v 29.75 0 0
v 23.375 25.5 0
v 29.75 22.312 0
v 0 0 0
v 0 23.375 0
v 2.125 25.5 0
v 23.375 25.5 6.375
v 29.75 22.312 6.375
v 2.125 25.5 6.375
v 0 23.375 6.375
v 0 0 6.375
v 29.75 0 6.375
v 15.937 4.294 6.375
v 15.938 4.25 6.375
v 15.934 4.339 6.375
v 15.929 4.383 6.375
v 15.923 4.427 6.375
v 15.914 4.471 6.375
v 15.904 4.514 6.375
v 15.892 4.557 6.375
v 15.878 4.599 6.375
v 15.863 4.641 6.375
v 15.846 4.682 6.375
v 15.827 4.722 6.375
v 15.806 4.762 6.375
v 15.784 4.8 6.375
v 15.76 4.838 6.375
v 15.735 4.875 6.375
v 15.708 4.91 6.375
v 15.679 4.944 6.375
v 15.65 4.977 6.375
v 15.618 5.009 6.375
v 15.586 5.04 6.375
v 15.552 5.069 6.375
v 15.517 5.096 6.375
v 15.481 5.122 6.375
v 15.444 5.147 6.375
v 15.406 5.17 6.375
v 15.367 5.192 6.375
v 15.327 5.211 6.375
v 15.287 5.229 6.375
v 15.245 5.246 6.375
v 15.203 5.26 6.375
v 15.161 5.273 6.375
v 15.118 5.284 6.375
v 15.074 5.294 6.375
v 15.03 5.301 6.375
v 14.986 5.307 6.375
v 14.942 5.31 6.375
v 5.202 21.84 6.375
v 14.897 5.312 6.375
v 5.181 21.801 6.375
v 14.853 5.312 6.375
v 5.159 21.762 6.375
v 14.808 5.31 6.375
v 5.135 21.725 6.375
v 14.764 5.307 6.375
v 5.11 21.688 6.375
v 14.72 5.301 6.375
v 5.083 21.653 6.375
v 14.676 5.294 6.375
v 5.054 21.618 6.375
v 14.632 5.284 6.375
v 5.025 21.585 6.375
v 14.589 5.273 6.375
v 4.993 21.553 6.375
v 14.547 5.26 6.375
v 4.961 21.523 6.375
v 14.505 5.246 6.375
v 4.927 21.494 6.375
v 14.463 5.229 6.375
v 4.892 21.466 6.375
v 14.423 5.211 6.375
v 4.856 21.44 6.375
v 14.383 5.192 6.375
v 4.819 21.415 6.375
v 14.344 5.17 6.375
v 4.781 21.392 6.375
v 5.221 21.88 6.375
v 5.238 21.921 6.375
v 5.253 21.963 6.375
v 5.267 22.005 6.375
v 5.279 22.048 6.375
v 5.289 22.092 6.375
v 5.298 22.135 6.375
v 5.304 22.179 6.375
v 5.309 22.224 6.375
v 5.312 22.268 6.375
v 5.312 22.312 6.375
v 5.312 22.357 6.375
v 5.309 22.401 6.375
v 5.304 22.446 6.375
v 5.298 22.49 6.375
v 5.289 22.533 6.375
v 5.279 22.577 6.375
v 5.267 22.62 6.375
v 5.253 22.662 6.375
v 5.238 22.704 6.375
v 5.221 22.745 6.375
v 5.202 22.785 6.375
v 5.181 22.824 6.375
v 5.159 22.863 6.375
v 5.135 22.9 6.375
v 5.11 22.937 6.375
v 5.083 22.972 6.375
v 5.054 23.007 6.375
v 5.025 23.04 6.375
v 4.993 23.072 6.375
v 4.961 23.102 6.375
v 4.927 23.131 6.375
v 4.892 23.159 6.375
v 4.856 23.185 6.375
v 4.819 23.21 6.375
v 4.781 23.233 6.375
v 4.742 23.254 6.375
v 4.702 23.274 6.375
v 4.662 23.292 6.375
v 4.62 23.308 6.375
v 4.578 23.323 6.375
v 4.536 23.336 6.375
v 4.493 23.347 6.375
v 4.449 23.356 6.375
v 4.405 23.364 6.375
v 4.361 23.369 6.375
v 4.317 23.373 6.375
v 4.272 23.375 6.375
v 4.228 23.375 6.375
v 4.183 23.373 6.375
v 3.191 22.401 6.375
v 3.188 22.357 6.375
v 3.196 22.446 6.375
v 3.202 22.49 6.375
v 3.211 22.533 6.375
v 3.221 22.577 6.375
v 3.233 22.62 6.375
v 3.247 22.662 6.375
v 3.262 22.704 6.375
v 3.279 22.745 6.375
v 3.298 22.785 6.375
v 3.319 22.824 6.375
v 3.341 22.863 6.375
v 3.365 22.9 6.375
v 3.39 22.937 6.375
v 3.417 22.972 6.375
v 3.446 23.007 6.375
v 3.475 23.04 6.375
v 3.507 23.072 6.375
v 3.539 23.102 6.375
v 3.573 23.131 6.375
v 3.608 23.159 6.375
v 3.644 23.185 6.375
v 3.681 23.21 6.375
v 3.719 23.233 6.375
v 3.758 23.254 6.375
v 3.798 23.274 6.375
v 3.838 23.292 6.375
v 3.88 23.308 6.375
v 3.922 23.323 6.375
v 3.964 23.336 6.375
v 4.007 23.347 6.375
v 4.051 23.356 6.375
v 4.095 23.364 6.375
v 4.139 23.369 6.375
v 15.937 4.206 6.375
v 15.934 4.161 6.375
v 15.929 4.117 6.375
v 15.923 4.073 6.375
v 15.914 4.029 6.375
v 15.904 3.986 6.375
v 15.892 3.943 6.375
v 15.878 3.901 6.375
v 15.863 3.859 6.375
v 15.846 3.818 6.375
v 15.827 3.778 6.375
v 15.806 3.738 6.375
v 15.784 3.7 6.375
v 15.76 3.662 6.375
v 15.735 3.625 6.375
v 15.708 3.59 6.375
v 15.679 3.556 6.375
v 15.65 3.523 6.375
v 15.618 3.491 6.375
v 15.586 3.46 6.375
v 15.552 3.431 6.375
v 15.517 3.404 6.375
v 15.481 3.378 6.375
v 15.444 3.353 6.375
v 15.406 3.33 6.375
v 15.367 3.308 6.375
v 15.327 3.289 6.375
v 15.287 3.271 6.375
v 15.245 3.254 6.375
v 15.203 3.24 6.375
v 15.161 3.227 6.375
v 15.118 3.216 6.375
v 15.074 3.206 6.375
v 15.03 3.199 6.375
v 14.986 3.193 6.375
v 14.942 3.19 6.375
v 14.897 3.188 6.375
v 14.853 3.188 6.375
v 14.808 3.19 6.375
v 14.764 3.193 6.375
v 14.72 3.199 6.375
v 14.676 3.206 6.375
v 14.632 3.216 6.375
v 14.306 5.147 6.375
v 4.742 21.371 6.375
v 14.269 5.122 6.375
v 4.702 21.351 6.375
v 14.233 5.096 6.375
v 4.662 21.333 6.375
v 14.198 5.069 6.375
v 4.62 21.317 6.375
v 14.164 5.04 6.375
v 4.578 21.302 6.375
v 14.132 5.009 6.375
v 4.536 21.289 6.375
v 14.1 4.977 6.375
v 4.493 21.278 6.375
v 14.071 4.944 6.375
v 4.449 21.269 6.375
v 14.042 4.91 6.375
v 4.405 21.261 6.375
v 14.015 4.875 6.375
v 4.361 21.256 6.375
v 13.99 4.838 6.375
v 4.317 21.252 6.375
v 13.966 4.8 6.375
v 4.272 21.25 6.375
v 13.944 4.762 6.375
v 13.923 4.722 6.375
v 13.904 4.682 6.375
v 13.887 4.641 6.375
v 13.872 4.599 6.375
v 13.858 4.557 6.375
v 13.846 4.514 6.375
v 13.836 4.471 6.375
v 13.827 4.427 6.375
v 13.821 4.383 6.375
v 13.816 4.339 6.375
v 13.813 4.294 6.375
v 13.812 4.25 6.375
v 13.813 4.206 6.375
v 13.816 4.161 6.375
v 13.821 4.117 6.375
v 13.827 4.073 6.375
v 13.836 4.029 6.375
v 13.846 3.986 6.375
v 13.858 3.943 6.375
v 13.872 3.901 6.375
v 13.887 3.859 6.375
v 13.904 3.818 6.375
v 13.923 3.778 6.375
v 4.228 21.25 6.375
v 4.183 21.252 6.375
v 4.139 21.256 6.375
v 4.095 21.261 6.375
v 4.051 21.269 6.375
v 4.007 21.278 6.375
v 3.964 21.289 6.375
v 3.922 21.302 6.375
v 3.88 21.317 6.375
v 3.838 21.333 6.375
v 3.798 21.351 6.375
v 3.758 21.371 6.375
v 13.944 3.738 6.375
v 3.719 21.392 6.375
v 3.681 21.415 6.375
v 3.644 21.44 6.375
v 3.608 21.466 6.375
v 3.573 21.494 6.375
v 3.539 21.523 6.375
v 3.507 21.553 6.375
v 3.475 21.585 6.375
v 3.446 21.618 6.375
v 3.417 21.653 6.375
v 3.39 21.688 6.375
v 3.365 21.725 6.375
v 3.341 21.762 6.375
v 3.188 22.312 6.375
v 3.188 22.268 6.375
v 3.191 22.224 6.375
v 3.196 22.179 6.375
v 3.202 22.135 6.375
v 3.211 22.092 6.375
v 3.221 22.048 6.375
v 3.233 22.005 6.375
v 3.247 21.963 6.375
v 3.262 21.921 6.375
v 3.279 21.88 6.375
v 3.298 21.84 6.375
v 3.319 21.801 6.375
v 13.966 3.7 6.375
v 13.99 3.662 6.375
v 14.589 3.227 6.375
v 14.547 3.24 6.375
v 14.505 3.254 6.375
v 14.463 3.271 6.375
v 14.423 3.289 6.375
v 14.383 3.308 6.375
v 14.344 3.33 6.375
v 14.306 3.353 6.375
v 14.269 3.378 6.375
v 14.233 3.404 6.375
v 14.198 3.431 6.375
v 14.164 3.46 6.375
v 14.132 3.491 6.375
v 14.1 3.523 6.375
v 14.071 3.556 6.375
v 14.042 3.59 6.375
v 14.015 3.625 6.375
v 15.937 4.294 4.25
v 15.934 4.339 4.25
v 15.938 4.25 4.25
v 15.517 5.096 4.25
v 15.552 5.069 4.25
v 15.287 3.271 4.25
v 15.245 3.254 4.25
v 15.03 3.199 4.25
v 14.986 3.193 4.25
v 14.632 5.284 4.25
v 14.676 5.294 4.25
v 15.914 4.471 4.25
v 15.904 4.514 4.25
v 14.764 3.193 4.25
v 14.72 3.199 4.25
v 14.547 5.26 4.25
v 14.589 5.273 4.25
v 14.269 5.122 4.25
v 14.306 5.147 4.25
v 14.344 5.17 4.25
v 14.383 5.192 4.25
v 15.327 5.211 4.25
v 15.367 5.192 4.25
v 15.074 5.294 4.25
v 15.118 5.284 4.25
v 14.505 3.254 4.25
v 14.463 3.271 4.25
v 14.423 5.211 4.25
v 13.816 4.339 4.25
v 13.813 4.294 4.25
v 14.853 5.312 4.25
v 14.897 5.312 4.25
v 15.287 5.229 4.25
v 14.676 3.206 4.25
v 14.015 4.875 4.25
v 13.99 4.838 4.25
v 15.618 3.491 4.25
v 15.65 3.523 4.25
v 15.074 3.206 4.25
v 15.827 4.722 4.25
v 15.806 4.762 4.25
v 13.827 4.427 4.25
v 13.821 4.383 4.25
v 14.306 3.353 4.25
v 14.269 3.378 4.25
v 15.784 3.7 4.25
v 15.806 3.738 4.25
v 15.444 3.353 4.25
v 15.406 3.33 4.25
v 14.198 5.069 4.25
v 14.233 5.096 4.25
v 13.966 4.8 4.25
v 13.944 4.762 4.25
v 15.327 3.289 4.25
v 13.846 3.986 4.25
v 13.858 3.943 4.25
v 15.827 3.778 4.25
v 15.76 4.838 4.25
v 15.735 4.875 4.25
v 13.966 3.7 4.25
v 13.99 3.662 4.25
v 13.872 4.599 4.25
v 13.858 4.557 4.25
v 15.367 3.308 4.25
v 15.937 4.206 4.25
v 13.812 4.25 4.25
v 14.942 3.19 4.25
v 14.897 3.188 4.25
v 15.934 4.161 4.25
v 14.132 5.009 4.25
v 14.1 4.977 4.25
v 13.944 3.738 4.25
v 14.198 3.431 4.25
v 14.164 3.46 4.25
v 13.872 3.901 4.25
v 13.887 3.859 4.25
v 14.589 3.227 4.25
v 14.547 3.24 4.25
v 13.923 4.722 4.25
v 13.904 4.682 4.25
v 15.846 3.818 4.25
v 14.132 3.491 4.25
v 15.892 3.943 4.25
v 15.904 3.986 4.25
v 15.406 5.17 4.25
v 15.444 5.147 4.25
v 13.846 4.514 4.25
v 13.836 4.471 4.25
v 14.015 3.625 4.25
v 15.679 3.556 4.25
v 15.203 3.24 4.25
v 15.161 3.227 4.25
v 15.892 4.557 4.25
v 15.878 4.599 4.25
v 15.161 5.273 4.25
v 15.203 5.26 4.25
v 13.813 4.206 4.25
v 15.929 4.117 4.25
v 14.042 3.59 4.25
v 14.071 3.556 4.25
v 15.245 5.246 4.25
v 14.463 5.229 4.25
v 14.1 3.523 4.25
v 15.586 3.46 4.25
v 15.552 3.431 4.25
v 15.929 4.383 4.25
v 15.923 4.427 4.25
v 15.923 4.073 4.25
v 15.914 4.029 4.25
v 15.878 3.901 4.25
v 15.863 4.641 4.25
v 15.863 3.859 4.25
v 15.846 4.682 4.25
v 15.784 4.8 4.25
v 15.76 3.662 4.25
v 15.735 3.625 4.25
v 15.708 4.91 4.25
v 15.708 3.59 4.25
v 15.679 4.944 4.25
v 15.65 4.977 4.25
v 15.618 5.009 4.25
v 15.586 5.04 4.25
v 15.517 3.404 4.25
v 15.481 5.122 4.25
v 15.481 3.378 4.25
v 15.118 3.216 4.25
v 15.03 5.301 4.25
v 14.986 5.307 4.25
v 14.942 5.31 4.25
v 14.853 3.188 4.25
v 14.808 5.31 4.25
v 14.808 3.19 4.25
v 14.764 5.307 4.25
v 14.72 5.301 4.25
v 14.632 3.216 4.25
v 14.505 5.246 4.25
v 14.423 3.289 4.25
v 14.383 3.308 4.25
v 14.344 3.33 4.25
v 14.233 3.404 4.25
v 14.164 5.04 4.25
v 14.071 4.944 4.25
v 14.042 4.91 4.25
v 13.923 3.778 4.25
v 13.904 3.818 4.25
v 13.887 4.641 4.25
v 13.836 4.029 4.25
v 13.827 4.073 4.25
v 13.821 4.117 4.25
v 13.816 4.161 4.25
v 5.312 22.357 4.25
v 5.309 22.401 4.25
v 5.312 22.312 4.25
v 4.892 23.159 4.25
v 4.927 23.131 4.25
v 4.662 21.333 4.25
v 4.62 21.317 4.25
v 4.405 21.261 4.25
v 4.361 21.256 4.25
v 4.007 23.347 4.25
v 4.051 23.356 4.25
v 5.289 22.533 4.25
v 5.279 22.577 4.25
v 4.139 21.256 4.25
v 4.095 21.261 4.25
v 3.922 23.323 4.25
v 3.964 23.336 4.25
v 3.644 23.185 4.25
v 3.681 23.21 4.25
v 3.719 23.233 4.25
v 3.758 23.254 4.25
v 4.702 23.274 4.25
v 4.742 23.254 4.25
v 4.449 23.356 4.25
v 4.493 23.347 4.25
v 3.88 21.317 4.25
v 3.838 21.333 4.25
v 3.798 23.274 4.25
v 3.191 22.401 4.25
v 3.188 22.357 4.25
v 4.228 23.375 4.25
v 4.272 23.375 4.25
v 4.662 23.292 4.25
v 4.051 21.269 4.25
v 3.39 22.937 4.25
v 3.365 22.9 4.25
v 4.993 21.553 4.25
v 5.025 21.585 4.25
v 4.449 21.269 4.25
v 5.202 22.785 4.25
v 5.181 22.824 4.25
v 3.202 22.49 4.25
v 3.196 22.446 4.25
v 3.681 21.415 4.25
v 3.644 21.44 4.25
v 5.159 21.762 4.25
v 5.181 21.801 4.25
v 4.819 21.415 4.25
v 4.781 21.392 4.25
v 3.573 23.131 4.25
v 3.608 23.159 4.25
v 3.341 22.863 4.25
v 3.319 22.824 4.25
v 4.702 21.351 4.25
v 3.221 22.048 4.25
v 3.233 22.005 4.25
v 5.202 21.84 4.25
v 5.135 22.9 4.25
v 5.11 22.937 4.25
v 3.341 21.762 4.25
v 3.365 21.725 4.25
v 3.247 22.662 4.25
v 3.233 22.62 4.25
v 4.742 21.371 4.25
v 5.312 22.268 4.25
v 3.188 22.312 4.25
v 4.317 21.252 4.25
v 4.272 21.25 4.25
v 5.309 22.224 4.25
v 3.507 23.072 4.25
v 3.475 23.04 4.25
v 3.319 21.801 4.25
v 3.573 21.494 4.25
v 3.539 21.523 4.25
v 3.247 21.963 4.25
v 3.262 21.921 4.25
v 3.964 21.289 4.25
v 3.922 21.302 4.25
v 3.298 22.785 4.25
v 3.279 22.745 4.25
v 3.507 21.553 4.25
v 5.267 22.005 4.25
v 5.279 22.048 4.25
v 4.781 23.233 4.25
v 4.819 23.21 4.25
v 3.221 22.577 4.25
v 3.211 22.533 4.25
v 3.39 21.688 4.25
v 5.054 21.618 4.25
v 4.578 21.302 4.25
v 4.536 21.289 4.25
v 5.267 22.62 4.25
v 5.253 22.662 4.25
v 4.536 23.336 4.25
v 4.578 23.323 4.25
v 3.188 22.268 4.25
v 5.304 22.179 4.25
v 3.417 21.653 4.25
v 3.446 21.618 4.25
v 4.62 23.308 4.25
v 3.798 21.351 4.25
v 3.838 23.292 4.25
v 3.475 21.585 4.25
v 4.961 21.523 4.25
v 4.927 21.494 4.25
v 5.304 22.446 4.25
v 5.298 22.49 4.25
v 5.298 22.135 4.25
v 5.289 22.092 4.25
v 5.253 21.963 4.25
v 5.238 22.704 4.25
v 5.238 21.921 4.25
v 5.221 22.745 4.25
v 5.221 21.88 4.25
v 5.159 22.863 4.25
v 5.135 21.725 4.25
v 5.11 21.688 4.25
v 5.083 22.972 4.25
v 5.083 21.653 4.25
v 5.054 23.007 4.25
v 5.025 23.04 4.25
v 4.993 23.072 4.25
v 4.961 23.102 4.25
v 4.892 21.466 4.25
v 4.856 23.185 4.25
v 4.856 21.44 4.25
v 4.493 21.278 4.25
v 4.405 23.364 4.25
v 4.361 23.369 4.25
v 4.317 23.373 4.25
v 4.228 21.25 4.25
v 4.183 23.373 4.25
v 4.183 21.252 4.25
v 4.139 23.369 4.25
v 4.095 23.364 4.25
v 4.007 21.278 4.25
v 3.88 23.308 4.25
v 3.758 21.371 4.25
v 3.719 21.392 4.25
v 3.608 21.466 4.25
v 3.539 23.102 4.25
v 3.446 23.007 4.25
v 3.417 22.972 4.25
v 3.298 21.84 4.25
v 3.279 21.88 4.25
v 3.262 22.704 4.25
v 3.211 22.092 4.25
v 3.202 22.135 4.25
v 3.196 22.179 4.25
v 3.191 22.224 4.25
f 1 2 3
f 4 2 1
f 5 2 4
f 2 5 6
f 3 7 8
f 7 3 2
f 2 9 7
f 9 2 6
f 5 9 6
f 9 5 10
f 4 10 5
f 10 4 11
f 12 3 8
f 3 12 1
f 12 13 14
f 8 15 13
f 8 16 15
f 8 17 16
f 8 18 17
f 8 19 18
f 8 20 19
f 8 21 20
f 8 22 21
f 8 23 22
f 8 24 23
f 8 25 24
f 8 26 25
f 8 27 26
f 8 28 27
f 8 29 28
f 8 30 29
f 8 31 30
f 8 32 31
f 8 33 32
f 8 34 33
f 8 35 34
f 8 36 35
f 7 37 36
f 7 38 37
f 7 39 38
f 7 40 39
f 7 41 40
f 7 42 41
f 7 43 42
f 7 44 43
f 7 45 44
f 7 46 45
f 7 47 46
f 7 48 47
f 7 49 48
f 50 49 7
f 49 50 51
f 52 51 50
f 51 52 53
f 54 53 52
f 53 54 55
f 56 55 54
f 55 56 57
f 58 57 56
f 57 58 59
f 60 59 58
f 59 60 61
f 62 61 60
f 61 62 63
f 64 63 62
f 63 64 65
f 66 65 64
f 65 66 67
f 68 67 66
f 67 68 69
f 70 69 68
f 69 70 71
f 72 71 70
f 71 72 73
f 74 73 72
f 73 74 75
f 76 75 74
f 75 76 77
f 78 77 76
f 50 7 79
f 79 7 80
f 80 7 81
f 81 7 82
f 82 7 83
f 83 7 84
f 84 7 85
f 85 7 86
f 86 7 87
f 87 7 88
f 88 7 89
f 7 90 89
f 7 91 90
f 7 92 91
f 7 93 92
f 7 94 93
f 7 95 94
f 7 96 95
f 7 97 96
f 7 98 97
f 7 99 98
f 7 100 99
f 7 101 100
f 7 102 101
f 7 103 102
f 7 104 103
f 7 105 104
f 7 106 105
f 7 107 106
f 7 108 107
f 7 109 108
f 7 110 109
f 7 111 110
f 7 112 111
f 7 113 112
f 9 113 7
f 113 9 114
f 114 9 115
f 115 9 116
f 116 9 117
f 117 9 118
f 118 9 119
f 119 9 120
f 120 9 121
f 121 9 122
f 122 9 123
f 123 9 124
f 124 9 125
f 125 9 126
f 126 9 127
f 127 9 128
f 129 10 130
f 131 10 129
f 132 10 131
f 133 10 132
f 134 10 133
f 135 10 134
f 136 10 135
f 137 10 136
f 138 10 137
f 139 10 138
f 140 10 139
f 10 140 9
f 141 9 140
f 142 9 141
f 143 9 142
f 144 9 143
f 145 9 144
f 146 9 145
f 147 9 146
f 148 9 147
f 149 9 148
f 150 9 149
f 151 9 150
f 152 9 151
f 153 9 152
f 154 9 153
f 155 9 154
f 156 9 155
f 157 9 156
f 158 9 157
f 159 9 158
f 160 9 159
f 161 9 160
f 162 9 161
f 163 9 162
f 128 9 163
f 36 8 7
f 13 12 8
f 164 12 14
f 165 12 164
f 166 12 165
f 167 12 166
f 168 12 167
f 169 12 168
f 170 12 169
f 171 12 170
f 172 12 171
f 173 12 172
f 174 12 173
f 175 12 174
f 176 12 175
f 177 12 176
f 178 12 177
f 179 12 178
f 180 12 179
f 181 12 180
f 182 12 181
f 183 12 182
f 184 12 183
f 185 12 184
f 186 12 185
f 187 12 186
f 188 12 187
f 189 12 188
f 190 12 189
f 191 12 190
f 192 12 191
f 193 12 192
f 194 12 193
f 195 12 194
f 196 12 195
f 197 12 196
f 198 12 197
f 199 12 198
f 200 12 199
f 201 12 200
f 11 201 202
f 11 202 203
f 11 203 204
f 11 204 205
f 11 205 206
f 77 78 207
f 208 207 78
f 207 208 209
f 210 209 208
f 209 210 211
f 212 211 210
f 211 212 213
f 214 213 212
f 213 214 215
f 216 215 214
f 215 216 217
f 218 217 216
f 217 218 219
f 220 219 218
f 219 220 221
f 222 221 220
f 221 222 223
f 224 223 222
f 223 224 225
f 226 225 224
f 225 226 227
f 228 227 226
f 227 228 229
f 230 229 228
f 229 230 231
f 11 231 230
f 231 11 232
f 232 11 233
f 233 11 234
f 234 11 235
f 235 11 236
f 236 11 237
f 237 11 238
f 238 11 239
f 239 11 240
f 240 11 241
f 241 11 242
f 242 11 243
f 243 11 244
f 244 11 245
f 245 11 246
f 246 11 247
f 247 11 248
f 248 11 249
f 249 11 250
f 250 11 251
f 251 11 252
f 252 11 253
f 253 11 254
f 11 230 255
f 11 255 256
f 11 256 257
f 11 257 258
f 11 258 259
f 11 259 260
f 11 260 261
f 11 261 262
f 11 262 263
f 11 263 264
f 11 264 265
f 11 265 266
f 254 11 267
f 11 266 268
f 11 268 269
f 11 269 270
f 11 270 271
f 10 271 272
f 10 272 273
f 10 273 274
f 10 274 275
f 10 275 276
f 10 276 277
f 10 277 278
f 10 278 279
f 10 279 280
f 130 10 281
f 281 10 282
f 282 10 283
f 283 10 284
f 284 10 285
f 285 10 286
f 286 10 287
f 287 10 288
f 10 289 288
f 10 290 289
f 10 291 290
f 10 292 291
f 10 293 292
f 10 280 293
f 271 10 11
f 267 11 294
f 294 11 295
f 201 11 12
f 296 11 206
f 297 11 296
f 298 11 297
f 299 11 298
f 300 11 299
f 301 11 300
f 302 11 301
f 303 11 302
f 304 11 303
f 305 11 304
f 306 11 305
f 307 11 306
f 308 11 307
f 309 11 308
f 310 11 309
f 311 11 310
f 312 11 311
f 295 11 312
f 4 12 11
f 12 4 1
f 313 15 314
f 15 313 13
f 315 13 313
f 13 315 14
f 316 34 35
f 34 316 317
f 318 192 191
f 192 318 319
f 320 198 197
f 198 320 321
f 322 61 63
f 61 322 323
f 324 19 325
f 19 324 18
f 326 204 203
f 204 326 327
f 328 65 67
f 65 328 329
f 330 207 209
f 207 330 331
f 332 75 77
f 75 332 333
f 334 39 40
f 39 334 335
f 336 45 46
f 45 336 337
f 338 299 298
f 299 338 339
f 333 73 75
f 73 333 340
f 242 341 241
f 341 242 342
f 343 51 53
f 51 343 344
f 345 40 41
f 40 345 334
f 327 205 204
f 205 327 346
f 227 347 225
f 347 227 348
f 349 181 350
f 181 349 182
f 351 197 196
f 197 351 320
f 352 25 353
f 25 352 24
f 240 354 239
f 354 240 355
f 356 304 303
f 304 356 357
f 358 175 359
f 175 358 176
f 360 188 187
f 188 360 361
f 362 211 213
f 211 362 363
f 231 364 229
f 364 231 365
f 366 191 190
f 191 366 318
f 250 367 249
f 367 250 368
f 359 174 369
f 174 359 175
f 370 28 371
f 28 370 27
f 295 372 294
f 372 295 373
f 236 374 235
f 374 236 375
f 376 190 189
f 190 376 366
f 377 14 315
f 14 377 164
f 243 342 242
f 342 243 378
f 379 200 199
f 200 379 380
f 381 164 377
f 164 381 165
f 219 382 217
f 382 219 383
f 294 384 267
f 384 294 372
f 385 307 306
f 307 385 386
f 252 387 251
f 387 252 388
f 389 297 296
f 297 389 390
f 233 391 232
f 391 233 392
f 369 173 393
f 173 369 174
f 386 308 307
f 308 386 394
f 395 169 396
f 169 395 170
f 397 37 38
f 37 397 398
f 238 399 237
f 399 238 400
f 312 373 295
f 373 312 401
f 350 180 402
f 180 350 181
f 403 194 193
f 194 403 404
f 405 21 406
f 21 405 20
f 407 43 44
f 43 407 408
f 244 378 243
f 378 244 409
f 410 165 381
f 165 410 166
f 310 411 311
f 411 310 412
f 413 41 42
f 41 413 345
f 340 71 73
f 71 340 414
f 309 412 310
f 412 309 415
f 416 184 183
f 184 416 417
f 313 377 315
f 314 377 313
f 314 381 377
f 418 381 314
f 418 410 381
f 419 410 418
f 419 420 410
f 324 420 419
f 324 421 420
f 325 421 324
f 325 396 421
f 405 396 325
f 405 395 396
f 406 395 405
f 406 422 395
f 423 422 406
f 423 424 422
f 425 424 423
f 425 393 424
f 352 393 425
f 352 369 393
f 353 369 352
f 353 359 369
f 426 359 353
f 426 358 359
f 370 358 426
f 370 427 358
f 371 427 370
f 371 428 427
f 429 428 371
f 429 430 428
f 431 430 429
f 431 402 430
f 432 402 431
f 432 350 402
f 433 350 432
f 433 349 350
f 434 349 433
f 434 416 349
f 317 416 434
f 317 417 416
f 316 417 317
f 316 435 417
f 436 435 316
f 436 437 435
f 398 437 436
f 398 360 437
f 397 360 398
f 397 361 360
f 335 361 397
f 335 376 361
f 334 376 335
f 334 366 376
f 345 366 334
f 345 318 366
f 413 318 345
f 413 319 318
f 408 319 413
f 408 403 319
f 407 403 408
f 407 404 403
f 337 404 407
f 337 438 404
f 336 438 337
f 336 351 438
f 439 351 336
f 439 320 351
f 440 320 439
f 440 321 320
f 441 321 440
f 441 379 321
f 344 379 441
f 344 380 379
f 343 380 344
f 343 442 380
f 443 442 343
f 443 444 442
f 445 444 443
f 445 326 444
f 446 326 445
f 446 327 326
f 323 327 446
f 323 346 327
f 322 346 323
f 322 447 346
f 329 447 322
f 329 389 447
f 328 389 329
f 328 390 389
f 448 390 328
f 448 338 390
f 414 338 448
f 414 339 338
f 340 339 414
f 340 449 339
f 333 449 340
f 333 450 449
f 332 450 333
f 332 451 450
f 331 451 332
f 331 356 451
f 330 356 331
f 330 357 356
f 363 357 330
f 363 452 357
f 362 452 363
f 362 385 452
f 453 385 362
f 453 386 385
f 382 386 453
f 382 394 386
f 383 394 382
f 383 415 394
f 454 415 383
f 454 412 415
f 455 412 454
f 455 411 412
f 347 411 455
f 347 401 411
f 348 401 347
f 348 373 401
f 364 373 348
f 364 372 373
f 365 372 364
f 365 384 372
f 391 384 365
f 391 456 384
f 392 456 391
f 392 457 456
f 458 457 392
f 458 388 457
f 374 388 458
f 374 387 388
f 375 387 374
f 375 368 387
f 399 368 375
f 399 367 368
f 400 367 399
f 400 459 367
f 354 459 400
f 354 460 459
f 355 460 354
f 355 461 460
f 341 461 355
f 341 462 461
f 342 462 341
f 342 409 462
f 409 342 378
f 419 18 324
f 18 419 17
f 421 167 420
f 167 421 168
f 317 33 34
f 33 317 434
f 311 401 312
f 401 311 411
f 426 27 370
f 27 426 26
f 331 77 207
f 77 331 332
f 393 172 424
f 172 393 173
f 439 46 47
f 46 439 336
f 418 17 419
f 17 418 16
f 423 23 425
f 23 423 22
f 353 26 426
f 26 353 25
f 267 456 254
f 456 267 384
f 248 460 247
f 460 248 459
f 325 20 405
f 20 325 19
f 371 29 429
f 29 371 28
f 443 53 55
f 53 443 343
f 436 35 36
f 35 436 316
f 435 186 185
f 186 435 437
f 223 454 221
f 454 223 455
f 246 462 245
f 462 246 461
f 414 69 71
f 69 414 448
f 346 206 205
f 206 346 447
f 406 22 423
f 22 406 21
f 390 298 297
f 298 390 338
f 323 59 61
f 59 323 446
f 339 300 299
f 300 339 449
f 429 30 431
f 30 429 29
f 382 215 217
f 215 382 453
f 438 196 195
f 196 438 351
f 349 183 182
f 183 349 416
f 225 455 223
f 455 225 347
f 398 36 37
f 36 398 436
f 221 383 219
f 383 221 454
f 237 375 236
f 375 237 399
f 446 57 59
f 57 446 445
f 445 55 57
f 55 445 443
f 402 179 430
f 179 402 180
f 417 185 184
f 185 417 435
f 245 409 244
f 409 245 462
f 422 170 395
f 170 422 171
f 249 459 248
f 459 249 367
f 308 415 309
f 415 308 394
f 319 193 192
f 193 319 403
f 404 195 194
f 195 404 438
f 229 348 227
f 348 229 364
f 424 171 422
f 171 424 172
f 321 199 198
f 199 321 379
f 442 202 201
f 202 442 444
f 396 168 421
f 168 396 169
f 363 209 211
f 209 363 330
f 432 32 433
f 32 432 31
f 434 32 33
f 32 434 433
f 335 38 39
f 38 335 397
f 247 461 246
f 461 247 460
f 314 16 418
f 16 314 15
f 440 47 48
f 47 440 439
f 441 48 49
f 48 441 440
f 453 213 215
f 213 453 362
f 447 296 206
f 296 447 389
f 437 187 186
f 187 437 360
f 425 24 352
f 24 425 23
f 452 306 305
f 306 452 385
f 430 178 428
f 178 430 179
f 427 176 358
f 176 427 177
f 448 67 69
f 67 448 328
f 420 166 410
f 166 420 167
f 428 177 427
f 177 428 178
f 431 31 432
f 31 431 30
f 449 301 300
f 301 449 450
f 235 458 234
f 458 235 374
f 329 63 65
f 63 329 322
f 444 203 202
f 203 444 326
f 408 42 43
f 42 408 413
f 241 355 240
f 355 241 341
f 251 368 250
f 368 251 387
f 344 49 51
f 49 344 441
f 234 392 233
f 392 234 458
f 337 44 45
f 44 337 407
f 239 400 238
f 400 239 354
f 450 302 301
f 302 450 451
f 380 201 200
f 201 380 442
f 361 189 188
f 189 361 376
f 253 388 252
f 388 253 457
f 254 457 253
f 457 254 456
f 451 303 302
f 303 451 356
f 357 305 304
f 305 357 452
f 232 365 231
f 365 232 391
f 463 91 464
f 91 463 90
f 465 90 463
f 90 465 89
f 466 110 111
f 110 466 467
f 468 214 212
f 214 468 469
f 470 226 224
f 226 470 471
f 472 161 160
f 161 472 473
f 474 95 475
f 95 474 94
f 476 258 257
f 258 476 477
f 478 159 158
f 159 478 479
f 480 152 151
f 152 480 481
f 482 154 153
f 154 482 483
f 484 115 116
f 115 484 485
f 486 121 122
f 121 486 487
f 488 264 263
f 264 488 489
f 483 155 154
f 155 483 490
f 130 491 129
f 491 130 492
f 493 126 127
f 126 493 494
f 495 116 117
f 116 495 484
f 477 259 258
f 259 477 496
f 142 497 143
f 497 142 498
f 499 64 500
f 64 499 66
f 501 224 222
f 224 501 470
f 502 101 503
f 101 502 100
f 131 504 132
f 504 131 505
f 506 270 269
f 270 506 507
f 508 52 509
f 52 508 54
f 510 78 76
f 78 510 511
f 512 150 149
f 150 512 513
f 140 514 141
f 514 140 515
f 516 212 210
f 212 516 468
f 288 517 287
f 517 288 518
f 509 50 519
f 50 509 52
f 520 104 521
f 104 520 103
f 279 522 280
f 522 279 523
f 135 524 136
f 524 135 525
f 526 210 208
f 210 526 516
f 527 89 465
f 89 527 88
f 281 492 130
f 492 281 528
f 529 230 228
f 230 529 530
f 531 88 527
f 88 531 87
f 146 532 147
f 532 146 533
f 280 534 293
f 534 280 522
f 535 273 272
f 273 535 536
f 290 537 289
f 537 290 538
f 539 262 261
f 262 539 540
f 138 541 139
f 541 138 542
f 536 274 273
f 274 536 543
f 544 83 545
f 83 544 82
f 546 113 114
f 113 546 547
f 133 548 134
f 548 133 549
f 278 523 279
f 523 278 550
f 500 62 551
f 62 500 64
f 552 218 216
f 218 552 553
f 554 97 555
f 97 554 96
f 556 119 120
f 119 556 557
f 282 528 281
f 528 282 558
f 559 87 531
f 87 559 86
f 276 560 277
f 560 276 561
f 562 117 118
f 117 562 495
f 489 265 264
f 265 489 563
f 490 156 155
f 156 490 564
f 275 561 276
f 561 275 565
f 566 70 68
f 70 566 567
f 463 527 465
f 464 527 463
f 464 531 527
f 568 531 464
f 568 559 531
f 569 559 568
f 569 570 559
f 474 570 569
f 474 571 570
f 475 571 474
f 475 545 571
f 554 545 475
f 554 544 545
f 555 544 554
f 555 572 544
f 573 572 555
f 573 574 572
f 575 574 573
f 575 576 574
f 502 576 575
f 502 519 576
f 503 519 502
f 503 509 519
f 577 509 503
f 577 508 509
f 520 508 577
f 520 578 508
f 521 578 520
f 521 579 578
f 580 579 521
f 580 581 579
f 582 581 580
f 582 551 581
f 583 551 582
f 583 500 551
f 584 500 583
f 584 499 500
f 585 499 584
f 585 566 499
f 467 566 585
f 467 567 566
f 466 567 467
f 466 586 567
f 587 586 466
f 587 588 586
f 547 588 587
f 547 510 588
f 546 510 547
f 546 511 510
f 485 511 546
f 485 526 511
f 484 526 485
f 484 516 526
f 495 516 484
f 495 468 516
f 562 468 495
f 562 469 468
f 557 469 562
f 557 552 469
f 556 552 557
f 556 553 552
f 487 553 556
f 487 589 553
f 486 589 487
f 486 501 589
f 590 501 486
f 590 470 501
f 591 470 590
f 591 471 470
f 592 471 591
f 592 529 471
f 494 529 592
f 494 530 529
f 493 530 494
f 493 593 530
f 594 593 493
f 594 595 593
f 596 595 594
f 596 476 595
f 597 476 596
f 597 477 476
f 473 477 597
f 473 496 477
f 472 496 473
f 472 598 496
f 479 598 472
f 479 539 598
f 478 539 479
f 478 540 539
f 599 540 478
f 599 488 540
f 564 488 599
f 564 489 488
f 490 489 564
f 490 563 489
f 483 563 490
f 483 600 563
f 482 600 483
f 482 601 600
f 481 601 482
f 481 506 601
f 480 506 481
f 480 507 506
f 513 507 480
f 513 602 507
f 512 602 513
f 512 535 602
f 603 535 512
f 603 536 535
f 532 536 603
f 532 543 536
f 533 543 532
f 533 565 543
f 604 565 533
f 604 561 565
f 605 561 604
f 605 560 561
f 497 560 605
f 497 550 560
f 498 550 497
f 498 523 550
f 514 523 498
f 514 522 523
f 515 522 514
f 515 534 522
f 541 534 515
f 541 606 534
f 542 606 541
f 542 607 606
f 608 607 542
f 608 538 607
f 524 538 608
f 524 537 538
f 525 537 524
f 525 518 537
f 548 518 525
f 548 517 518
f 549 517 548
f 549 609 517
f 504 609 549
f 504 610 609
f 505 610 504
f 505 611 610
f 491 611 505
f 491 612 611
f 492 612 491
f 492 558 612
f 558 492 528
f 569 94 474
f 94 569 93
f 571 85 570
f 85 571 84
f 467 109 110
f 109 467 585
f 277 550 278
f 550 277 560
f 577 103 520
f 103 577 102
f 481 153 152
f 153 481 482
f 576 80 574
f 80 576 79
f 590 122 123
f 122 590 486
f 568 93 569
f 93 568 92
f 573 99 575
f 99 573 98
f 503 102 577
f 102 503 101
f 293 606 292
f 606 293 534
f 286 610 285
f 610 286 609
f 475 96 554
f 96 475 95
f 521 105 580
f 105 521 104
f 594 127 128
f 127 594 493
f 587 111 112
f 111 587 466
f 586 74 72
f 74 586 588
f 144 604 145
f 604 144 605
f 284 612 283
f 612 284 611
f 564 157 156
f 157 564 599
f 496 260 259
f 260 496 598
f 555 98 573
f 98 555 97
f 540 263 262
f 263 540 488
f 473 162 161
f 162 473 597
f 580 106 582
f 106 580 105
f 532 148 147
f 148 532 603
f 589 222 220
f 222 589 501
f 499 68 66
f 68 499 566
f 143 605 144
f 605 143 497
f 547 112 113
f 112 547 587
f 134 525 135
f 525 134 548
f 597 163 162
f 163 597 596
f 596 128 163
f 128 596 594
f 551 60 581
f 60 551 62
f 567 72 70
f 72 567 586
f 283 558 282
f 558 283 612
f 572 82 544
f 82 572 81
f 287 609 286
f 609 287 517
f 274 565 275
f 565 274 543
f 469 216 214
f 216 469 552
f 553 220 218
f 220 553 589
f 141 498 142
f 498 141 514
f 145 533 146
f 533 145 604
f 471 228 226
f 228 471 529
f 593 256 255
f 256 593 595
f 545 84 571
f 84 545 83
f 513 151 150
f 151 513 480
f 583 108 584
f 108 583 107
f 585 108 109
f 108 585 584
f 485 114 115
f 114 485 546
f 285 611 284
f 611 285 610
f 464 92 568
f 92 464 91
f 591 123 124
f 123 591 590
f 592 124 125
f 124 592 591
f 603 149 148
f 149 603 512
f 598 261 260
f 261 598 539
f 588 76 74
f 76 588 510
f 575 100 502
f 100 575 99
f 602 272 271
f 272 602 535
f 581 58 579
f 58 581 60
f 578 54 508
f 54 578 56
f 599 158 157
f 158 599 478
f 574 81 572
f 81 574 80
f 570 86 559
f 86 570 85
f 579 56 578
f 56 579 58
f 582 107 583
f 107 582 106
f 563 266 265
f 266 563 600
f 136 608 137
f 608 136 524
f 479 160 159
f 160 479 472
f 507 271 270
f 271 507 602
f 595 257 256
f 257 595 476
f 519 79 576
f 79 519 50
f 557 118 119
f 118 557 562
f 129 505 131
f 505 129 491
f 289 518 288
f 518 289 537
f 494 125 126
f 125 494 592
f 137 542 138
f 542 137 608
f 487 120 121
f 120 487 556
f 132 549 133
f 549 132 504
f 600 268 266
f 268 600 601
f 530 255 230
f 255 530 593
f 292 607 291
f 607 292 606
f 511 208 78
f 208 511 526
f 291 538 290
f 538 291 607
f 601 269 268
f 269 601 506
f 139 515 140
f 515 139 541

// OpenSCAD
$fn = 150;

difference() {
	translate(v = [29.75, 0, 6.375]) {
		rotate(a = [0, 180, 0]) {
			linear_extrude(height = 6.375) {
				polygon(points = [[0, 0], [0, 22.3125], [6.375, 25.5], [27.625, 25.5], [29.75, 23.375], [29.75, 0]]);
			}
		}
	}
	translate(v = [14.875, 4.25, 4.25]) {
		cylinder(d = 2.125, h = 3.125);
	}
	translate(v = [4.25, 22.3125, 4.25]) {
		cylinder(d = 2.125, h = 3.125);
	}
}
